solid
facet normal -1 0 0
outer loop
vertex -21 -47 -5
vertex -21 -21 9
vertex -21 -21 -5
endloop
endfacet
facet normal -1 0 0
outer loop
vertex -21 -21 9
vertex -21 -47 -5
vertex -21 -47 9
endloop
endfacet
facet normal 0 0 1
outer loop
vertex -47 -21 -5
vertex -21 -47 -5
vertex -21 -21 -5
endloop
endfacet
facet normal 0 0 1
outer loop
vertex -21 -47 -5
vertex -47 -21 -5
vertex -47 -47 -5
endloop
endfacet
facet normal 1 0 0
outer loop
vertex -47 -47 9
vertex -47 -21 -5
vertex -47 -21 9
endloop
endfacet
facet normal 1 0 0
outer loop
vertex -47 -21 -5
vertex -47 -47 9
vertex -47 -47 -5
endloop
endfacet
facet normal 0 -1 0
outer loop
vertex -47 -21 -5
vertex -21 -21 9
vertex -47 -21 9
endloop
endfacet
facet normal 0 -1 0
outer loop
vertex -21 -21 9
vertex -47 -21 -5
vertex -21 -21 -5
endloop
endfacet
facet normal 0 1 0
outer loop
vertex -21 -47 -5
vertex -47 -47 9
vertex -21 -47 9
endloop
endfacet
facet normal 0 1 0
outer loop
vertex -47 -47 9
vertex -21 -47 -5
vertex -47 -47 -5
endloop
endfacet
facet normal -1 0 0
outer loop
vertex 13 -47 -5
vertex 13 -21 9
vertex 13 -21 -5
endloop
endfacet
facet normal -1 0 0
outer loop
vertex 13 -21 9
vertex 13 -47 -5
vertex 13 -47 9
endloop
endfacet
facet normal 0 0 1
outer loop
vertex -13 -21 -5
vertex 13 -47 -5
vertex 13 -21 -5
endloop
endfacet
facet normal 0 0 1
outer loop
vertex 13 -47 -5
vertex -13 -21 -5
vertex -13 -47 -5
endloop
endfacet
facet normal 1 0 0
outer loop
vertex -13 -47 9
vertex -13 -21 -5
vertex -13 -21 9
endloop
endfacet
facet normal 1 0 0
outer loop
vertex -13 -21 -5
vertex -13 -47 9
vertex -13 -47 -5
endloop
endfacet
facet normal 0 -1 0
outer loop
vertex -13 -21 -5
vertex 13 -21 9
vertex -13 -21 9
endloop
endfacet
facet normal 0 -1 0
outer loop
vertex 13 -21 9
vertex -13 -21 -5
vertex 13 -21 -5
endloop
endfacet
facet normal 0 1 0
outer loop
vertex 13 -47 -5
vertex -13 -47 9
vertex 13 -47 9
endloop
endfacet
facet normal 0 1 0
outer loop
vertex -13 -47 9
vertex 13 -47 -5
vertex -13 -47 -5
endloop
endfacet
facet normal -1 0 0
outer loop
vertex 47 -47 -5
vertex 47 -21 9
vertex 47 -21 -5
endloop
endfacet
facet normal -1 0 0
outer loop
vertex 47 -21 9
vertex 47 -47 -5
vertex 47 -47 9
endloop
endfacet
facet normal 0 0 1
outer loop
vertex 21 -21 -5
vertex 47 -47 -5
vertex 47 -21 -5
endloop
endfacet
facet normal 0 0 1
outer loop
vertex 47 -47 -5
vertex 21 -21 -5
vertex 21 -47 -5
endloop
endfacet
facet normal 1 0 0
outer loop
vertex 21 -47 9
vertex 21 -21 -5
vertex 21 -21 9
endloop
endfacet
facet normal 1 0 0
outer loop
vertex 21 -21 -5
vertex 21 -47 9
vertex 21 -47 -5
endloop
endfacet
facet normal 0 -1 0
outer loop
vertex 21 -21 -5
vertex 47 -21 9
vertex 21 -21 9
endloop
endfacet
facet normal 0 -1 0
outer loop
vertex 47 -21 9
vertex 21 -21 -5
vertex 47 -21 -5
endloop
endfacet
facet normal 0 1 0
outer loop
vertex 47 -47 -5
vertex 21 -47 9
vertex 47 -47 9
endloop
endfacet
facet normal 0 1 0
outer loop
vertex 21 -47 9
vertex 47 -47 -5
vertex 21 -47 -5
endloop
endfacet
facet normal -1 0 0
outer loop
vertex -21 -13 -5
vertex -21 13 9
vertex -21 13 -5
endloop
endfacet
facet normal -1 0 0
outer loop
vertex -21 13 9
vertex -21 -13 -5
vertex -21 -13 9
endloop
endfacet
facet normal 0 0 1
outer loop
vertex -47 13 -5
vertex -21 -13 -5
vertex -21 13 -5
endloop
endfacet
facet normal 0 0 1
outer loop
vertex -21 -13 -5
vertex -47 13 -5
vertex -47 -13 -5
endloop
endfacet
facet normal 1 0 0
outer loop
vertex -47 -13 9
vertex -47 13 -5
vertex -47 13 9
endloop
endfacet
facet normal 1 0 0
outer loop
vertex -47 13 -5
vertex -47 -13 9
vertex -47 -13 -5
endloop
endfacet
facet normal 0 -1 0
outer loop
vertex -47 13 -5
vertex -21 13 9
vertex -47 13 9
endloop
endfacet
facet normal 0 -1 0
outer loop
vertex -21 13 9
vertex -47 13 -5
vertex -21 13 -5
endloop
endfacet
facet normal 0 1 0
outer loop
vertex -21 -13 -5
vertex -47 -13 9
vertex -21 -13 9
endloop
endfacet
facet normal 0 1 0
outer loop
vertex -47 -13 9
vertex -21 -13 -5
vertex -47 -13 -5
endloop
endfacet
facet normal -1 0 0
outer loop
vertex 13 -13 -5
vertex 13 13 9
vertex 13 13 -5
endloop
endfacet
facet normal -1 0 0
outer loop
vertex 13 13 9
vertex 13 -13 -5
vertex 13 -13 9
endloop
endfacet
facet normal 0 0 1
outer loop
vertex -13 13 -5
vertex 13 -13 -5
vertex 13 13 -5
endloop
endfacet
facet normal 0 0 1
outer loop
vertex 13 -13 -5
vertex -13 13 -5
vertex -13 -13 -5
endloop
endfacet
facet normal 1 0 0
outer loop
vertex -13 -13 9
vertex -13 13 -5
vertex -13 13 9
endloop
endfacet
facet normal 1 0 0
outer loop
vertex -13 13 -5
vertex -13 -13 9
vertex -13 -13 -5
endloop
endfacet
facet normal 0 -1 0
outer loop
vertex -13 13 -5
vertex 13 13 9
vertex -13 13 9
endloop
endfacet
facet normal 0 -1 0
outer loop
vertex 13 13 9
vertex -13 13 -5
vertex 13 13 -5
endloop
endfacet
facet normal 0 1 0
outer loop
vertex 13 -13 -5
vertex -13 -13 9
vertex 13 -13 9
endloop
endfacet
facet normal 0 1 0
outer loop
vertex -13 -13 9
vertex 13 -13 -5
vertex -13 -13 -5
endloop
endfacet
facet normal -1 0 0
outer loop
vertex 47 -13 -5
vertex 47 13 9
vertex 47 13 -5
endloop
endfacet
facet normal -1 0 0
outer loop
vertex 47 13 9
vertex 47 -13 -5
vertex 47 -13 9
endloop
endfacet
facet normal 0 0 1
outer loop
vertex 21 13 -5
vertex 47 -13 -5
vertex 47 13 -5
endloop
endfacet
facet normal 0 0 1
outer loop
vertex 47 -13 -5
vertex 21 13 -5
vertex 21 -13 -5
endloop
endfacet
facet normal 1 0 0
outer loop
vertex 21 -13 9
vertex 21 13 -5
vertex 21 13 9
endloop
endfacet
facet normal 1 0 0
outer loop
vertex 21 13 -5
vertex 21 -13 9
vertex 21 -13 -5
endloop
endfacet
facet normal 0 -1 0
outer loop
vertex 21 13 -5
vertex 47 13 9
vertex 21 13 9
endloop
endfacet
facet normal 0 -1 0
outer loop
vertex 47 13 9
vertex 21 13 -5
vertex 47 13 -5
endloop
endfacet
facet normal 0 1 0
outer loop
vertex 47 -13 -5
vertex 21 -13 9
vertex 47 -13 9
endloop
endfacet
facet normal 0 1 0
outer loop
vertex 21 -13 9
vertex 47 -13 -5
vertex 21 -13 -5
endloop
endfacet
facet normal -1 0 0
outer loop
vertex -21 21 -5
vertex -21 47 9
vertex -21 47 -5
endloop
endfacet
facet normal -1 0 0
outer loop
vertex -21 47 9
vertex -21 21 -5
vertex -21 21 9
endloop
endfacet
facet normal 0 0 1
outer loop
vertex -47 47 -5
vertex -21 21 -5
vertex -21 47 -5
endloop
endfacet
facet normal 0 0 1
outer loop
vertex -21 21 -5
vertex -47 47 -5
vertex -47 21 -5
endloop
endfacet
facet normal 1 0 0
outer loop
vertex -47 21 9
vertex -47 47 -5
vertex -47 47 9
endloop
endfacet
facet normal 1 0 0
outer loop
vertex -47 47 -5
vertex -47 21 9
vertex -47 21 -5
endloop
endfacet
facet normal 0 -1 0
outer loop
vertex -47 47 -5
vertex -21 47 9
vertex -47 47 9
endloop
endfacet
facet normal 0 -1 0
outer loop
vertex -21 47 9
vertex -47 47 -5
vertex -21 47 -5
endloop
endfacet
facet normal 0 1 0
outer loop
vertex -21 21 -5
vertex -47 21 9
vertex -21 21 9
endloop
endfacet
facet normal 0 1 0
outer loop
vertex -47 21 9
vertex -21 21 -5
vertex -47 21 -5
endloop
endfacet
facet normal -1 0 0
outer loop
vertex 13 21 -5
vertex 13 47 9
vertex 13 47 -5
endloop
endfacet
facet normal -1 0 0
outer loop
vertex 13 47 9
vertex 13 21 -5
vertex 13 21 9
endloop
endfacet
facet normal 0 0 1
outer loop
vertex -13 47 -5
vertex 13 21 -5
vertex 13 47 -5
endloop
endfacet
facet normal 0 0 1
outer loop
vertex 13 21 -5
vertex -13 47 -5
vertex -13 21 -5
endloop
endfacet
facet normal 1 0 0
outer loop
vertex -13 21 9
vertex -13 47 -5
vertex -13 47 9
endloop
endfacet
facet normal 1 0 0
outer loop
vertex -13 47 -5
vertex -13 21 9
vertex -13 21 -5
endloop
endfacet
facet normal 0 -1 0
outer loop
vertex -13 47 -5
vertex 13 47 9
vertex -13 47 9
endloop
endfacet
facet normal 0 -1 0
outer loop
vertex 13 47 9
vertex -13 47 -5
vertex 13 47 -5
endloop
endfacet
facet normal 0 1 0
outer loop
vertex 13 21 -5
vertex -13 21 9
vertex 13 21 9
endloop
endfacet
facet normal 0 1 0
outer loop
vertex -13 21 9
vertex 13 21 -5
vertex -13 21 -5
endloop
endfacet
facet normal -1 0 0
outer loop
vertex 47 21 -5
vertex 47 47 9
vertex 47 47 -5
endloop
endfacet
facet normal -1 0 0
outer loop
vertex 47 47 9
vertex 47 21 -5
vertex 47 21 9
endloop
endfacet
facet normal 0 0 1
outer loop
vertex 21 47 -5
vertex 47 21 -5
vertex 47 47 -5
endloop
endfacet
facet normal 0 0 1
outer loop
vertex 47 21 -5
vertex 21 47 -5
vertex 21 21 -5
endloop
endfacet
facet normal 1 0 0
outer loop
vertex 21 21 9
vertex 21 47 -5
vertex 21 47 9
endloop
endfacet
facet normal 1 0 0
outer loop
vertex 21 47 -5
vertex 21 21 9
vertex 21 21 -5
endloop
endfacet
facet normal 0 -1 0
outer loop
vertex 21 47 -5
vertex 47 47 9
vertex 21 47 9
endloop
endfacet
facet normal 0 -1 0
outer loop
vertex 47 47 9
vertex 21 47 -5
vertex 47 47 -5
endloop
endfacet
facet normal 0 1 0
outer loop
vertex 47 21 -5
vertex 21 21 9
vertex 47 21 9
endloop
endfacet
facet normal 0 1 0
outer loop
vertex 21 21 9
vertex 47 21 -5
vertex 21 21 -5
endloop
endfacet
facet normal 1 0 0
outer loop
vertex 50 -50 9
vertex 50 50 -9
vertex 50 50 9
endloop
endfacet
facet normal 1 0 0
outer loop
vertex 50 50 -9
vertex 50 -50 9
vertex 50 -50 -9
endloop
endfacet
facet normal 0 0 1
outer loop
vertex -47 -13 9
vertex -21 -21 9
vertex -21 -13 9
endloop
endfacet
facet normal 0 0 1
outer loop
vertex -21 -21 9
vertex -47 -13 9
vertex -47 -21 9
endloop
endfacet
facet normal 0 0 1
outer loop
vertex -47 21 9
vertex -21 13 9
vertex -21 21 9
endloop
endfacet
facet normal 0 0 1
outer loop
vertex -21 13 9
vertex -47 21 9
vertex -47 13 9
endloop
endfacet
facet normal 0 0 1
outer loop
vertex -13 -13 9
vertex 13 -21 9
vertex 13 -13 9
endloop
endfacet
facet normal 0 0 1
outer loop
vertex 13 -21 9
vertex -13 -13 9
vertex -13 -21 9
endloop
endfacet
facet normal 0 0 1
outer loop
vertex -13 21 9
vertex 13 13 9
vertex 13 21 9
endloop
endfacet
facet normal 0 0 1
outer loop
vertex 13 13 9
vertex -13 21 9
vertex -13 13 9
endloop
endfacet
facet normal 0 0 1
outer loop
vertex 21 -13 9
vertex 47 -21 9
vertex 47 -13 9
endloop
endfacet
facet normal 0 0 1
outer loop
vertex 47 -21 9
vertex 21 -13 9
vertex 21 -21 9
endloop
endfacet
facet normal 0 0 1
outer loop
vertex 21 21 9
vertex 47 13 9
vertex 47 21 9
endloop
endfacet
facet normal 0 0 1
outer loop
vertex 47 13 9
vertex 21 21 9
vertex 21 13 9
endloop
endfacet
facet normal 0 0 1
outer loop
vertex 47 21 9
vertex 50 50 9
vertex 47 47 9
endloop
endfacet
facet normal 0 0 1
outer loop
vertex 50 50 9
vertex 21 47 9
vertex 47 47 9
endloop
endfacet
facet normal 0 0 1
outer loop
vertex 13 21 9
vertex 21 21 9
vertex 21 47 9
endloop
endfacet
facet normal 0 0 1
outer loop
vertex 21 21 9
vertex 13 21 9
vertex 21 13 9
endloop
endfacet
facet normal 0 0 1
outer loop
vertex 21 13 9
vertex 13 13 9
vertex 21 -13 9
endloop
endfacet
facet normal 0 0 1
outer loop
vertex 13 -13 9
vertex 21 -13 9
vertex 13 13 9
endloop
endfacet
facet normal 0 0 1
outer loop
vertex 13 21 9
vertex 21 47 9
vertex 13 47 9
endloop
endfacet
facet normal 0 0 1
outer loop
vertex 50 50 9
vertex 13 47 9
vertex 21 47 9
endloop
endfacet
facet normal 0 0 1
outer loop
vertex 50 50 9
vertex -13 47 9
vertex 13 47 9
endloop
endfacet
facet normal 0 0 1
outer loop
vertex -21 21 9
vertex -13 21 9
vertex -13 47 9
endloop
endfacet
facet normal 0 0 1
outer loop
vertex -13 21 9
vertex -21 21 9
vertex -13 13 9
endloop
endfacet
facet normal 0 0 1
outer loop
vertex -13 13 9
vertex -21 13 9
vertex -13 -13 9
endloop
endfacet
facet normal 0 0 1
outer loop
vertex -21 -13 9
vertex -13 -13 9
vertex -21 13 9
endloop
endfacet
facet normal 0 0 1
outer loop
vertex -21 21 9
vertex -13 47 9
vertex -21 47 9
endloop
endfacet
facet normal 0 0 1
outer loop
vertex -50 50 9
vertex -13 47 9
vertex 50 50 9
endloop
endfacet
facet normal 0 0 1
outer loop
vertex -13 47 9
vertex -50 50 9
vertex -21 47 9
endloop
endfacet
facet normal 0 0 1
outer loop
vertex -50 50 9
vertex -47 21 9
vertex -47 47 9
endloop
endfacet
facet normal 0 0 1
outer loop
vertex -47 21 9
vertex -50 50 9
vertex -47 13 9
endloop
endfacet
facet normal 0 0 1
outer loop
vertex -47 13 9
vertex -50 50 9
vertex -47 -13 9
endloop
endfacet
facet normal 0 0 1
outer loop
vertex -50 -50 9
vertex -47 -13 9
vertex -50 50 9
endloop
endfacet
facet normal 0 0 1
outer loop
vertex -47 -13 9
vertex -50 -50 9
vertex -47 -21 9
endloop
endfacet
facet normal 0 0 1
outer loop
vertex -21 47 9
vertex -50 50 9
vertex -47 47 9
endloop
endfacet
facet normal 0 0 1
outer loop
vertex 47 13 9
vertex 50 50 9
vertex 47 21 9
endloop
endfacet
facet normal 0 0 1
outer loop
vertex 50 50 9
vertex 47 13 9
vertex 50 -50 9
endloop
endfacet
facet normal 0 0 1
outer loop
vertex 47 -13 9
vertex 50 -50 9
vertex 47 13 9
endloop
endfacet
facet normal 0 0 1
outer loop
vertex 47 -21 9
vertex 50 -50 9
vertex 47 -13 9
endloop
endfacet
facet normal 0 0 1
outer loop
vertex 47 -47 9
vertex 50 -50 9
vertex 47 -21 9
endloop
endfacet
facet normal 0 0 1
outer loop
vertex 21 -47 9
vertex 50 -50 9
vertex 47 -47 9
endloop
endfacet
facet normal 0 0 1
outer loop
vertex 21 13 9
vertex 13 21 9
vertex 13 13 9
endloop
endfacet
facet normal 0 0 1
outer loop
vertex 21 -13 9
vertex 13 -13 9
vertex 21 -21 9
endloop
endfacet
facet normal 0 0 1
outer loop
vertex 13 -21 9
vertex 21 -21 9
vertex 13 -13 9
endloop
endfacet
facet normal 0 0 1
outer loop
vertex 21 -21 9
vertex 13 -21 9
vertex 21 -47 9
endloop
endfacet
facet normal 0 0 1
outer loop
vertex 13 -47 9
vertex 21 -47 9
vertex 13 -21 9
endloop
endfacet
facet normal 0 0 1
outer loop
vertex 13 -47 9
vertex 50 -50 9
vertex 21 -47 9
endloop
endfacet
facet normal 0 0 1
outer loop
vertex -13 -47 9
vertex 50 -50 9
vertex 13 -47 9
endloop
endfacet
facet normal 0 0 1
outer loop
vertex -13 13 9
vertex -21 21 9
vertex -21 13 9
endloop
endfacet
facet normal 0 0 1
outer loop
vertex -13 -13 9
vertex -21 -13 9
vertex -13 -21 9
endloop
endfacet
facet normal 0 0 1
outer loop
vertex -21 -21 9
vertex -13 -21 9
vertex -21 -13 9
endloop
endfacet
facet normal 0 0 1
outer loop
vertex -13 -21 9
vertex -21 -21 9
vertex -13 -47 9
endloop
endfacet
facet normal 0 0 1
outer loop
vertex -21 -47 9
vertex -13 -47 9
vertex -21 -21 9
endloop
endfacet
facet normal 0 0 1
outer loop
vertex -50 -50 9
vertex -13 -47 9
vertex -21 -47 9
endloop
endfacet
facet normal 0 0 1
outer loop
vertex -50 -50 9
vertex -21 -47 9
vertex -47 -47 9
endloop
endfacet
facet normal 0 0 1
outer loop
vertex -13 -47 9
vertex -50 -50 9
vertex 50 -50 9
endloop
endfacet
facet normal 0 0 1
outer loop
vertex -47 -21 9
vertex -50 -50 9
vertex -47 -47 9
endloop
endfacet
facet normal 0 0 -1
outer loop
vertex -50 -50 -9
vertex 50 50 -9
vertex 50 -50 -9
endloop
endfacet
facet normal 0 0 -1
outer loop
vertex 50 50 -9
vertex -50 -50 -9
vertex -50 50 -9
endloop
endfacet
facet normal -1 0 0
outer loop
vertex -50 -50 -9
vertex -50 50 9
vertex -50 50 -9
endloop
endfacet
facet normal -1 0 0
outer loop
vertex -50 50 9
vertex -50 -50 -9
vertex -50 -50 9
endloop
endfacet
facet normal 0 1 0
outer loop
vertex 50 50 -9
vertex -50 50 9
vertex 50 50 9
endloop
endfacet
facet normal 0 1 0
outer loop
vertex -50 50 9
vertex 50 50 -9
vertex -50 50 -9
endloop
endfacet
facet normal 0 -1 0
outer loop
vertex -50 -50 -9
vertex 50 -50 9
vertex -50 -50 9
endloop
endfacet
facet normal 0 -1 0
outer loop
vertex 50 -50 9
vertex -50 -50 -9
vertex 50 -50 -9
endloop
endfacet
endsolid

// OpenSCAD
$fn = 32;

// ----------------------------------------------------------------------
// Pocket plate 100 x 100 x 18
// 3 x 3 pockets 26 mm square, 14 mm deep
// ----------------------------------------------------------------------

// --- parameters (mm) ---
thickness = 18;  // plate thickness
floor_t = 4;     // material left under each pocket
pocket = 26;     // pocket side length
pitch_x = 34;    // pocket pitch along X
pitch_y = 34;    // pocket pitch along Y
cols = 3;        // pockets per row
rows = 3;        // rows of pockets

// --- derived feature positions (mm) ---
depth = thickness - floor_t;        // = 14   pocket depth, down to the floor
span_x = (cols - 1) * pitch_x;      // = 68   distance between outer pockets
span_y = (rows - 1) * pitch_y;      // = 68   distance between outer pocket rows
origin_x = -span_x / 2;             // = -34   X of the first pocket
origin_y = -span_y / 2;             // = -34   Y of the first pocket
plate = [span_x + pocket + 6, span_y + pocket + 6, thickness];  // = [100, 100, 18]   overall size: pockets plus 3 mm of wall on each side
feature_centers = [
  [origin_x + 0 * pitch_x, origin_y + 0 * pitch_y],
  [origin_x + 1 * pitch_x, origin_y + 0 * pitch_y],
  [origin_x + 2 * pitch_x, origin_y + 0 * pitch_y],
  [origin_x + 0 * pitch_x, origin_y + 1 * pitch_y],
  [origin_x + 1 * pitch_x, origin_y + 1 * pitch_y],
  [origin_x + 2 * pitch_x, origin_y + 1 * pitch_y],
  [origin_x + 0 * pitch_x, origin_y + 2 * pitch_y],
  [origin_x + 1 * pitch_x, origin_y + 2 * pitch_y],
  [origin_x + 2 * pitch_x, origin_y + 2 * pitch_y]
];   // pocket centres, used verbatim by the cutter loop

// plate outline, then one pocket per centre in feature_centers
difference() {
  cube(plate, center = true);
  for (centre = feature_centers)
    translate([centre[0] - pocket / 2, centre[1] - pocket / 2, plate[2] / 2 - depth])
      cube([pocket, pocket, depth + 1]);  // centred on the declared pocket centre
}
